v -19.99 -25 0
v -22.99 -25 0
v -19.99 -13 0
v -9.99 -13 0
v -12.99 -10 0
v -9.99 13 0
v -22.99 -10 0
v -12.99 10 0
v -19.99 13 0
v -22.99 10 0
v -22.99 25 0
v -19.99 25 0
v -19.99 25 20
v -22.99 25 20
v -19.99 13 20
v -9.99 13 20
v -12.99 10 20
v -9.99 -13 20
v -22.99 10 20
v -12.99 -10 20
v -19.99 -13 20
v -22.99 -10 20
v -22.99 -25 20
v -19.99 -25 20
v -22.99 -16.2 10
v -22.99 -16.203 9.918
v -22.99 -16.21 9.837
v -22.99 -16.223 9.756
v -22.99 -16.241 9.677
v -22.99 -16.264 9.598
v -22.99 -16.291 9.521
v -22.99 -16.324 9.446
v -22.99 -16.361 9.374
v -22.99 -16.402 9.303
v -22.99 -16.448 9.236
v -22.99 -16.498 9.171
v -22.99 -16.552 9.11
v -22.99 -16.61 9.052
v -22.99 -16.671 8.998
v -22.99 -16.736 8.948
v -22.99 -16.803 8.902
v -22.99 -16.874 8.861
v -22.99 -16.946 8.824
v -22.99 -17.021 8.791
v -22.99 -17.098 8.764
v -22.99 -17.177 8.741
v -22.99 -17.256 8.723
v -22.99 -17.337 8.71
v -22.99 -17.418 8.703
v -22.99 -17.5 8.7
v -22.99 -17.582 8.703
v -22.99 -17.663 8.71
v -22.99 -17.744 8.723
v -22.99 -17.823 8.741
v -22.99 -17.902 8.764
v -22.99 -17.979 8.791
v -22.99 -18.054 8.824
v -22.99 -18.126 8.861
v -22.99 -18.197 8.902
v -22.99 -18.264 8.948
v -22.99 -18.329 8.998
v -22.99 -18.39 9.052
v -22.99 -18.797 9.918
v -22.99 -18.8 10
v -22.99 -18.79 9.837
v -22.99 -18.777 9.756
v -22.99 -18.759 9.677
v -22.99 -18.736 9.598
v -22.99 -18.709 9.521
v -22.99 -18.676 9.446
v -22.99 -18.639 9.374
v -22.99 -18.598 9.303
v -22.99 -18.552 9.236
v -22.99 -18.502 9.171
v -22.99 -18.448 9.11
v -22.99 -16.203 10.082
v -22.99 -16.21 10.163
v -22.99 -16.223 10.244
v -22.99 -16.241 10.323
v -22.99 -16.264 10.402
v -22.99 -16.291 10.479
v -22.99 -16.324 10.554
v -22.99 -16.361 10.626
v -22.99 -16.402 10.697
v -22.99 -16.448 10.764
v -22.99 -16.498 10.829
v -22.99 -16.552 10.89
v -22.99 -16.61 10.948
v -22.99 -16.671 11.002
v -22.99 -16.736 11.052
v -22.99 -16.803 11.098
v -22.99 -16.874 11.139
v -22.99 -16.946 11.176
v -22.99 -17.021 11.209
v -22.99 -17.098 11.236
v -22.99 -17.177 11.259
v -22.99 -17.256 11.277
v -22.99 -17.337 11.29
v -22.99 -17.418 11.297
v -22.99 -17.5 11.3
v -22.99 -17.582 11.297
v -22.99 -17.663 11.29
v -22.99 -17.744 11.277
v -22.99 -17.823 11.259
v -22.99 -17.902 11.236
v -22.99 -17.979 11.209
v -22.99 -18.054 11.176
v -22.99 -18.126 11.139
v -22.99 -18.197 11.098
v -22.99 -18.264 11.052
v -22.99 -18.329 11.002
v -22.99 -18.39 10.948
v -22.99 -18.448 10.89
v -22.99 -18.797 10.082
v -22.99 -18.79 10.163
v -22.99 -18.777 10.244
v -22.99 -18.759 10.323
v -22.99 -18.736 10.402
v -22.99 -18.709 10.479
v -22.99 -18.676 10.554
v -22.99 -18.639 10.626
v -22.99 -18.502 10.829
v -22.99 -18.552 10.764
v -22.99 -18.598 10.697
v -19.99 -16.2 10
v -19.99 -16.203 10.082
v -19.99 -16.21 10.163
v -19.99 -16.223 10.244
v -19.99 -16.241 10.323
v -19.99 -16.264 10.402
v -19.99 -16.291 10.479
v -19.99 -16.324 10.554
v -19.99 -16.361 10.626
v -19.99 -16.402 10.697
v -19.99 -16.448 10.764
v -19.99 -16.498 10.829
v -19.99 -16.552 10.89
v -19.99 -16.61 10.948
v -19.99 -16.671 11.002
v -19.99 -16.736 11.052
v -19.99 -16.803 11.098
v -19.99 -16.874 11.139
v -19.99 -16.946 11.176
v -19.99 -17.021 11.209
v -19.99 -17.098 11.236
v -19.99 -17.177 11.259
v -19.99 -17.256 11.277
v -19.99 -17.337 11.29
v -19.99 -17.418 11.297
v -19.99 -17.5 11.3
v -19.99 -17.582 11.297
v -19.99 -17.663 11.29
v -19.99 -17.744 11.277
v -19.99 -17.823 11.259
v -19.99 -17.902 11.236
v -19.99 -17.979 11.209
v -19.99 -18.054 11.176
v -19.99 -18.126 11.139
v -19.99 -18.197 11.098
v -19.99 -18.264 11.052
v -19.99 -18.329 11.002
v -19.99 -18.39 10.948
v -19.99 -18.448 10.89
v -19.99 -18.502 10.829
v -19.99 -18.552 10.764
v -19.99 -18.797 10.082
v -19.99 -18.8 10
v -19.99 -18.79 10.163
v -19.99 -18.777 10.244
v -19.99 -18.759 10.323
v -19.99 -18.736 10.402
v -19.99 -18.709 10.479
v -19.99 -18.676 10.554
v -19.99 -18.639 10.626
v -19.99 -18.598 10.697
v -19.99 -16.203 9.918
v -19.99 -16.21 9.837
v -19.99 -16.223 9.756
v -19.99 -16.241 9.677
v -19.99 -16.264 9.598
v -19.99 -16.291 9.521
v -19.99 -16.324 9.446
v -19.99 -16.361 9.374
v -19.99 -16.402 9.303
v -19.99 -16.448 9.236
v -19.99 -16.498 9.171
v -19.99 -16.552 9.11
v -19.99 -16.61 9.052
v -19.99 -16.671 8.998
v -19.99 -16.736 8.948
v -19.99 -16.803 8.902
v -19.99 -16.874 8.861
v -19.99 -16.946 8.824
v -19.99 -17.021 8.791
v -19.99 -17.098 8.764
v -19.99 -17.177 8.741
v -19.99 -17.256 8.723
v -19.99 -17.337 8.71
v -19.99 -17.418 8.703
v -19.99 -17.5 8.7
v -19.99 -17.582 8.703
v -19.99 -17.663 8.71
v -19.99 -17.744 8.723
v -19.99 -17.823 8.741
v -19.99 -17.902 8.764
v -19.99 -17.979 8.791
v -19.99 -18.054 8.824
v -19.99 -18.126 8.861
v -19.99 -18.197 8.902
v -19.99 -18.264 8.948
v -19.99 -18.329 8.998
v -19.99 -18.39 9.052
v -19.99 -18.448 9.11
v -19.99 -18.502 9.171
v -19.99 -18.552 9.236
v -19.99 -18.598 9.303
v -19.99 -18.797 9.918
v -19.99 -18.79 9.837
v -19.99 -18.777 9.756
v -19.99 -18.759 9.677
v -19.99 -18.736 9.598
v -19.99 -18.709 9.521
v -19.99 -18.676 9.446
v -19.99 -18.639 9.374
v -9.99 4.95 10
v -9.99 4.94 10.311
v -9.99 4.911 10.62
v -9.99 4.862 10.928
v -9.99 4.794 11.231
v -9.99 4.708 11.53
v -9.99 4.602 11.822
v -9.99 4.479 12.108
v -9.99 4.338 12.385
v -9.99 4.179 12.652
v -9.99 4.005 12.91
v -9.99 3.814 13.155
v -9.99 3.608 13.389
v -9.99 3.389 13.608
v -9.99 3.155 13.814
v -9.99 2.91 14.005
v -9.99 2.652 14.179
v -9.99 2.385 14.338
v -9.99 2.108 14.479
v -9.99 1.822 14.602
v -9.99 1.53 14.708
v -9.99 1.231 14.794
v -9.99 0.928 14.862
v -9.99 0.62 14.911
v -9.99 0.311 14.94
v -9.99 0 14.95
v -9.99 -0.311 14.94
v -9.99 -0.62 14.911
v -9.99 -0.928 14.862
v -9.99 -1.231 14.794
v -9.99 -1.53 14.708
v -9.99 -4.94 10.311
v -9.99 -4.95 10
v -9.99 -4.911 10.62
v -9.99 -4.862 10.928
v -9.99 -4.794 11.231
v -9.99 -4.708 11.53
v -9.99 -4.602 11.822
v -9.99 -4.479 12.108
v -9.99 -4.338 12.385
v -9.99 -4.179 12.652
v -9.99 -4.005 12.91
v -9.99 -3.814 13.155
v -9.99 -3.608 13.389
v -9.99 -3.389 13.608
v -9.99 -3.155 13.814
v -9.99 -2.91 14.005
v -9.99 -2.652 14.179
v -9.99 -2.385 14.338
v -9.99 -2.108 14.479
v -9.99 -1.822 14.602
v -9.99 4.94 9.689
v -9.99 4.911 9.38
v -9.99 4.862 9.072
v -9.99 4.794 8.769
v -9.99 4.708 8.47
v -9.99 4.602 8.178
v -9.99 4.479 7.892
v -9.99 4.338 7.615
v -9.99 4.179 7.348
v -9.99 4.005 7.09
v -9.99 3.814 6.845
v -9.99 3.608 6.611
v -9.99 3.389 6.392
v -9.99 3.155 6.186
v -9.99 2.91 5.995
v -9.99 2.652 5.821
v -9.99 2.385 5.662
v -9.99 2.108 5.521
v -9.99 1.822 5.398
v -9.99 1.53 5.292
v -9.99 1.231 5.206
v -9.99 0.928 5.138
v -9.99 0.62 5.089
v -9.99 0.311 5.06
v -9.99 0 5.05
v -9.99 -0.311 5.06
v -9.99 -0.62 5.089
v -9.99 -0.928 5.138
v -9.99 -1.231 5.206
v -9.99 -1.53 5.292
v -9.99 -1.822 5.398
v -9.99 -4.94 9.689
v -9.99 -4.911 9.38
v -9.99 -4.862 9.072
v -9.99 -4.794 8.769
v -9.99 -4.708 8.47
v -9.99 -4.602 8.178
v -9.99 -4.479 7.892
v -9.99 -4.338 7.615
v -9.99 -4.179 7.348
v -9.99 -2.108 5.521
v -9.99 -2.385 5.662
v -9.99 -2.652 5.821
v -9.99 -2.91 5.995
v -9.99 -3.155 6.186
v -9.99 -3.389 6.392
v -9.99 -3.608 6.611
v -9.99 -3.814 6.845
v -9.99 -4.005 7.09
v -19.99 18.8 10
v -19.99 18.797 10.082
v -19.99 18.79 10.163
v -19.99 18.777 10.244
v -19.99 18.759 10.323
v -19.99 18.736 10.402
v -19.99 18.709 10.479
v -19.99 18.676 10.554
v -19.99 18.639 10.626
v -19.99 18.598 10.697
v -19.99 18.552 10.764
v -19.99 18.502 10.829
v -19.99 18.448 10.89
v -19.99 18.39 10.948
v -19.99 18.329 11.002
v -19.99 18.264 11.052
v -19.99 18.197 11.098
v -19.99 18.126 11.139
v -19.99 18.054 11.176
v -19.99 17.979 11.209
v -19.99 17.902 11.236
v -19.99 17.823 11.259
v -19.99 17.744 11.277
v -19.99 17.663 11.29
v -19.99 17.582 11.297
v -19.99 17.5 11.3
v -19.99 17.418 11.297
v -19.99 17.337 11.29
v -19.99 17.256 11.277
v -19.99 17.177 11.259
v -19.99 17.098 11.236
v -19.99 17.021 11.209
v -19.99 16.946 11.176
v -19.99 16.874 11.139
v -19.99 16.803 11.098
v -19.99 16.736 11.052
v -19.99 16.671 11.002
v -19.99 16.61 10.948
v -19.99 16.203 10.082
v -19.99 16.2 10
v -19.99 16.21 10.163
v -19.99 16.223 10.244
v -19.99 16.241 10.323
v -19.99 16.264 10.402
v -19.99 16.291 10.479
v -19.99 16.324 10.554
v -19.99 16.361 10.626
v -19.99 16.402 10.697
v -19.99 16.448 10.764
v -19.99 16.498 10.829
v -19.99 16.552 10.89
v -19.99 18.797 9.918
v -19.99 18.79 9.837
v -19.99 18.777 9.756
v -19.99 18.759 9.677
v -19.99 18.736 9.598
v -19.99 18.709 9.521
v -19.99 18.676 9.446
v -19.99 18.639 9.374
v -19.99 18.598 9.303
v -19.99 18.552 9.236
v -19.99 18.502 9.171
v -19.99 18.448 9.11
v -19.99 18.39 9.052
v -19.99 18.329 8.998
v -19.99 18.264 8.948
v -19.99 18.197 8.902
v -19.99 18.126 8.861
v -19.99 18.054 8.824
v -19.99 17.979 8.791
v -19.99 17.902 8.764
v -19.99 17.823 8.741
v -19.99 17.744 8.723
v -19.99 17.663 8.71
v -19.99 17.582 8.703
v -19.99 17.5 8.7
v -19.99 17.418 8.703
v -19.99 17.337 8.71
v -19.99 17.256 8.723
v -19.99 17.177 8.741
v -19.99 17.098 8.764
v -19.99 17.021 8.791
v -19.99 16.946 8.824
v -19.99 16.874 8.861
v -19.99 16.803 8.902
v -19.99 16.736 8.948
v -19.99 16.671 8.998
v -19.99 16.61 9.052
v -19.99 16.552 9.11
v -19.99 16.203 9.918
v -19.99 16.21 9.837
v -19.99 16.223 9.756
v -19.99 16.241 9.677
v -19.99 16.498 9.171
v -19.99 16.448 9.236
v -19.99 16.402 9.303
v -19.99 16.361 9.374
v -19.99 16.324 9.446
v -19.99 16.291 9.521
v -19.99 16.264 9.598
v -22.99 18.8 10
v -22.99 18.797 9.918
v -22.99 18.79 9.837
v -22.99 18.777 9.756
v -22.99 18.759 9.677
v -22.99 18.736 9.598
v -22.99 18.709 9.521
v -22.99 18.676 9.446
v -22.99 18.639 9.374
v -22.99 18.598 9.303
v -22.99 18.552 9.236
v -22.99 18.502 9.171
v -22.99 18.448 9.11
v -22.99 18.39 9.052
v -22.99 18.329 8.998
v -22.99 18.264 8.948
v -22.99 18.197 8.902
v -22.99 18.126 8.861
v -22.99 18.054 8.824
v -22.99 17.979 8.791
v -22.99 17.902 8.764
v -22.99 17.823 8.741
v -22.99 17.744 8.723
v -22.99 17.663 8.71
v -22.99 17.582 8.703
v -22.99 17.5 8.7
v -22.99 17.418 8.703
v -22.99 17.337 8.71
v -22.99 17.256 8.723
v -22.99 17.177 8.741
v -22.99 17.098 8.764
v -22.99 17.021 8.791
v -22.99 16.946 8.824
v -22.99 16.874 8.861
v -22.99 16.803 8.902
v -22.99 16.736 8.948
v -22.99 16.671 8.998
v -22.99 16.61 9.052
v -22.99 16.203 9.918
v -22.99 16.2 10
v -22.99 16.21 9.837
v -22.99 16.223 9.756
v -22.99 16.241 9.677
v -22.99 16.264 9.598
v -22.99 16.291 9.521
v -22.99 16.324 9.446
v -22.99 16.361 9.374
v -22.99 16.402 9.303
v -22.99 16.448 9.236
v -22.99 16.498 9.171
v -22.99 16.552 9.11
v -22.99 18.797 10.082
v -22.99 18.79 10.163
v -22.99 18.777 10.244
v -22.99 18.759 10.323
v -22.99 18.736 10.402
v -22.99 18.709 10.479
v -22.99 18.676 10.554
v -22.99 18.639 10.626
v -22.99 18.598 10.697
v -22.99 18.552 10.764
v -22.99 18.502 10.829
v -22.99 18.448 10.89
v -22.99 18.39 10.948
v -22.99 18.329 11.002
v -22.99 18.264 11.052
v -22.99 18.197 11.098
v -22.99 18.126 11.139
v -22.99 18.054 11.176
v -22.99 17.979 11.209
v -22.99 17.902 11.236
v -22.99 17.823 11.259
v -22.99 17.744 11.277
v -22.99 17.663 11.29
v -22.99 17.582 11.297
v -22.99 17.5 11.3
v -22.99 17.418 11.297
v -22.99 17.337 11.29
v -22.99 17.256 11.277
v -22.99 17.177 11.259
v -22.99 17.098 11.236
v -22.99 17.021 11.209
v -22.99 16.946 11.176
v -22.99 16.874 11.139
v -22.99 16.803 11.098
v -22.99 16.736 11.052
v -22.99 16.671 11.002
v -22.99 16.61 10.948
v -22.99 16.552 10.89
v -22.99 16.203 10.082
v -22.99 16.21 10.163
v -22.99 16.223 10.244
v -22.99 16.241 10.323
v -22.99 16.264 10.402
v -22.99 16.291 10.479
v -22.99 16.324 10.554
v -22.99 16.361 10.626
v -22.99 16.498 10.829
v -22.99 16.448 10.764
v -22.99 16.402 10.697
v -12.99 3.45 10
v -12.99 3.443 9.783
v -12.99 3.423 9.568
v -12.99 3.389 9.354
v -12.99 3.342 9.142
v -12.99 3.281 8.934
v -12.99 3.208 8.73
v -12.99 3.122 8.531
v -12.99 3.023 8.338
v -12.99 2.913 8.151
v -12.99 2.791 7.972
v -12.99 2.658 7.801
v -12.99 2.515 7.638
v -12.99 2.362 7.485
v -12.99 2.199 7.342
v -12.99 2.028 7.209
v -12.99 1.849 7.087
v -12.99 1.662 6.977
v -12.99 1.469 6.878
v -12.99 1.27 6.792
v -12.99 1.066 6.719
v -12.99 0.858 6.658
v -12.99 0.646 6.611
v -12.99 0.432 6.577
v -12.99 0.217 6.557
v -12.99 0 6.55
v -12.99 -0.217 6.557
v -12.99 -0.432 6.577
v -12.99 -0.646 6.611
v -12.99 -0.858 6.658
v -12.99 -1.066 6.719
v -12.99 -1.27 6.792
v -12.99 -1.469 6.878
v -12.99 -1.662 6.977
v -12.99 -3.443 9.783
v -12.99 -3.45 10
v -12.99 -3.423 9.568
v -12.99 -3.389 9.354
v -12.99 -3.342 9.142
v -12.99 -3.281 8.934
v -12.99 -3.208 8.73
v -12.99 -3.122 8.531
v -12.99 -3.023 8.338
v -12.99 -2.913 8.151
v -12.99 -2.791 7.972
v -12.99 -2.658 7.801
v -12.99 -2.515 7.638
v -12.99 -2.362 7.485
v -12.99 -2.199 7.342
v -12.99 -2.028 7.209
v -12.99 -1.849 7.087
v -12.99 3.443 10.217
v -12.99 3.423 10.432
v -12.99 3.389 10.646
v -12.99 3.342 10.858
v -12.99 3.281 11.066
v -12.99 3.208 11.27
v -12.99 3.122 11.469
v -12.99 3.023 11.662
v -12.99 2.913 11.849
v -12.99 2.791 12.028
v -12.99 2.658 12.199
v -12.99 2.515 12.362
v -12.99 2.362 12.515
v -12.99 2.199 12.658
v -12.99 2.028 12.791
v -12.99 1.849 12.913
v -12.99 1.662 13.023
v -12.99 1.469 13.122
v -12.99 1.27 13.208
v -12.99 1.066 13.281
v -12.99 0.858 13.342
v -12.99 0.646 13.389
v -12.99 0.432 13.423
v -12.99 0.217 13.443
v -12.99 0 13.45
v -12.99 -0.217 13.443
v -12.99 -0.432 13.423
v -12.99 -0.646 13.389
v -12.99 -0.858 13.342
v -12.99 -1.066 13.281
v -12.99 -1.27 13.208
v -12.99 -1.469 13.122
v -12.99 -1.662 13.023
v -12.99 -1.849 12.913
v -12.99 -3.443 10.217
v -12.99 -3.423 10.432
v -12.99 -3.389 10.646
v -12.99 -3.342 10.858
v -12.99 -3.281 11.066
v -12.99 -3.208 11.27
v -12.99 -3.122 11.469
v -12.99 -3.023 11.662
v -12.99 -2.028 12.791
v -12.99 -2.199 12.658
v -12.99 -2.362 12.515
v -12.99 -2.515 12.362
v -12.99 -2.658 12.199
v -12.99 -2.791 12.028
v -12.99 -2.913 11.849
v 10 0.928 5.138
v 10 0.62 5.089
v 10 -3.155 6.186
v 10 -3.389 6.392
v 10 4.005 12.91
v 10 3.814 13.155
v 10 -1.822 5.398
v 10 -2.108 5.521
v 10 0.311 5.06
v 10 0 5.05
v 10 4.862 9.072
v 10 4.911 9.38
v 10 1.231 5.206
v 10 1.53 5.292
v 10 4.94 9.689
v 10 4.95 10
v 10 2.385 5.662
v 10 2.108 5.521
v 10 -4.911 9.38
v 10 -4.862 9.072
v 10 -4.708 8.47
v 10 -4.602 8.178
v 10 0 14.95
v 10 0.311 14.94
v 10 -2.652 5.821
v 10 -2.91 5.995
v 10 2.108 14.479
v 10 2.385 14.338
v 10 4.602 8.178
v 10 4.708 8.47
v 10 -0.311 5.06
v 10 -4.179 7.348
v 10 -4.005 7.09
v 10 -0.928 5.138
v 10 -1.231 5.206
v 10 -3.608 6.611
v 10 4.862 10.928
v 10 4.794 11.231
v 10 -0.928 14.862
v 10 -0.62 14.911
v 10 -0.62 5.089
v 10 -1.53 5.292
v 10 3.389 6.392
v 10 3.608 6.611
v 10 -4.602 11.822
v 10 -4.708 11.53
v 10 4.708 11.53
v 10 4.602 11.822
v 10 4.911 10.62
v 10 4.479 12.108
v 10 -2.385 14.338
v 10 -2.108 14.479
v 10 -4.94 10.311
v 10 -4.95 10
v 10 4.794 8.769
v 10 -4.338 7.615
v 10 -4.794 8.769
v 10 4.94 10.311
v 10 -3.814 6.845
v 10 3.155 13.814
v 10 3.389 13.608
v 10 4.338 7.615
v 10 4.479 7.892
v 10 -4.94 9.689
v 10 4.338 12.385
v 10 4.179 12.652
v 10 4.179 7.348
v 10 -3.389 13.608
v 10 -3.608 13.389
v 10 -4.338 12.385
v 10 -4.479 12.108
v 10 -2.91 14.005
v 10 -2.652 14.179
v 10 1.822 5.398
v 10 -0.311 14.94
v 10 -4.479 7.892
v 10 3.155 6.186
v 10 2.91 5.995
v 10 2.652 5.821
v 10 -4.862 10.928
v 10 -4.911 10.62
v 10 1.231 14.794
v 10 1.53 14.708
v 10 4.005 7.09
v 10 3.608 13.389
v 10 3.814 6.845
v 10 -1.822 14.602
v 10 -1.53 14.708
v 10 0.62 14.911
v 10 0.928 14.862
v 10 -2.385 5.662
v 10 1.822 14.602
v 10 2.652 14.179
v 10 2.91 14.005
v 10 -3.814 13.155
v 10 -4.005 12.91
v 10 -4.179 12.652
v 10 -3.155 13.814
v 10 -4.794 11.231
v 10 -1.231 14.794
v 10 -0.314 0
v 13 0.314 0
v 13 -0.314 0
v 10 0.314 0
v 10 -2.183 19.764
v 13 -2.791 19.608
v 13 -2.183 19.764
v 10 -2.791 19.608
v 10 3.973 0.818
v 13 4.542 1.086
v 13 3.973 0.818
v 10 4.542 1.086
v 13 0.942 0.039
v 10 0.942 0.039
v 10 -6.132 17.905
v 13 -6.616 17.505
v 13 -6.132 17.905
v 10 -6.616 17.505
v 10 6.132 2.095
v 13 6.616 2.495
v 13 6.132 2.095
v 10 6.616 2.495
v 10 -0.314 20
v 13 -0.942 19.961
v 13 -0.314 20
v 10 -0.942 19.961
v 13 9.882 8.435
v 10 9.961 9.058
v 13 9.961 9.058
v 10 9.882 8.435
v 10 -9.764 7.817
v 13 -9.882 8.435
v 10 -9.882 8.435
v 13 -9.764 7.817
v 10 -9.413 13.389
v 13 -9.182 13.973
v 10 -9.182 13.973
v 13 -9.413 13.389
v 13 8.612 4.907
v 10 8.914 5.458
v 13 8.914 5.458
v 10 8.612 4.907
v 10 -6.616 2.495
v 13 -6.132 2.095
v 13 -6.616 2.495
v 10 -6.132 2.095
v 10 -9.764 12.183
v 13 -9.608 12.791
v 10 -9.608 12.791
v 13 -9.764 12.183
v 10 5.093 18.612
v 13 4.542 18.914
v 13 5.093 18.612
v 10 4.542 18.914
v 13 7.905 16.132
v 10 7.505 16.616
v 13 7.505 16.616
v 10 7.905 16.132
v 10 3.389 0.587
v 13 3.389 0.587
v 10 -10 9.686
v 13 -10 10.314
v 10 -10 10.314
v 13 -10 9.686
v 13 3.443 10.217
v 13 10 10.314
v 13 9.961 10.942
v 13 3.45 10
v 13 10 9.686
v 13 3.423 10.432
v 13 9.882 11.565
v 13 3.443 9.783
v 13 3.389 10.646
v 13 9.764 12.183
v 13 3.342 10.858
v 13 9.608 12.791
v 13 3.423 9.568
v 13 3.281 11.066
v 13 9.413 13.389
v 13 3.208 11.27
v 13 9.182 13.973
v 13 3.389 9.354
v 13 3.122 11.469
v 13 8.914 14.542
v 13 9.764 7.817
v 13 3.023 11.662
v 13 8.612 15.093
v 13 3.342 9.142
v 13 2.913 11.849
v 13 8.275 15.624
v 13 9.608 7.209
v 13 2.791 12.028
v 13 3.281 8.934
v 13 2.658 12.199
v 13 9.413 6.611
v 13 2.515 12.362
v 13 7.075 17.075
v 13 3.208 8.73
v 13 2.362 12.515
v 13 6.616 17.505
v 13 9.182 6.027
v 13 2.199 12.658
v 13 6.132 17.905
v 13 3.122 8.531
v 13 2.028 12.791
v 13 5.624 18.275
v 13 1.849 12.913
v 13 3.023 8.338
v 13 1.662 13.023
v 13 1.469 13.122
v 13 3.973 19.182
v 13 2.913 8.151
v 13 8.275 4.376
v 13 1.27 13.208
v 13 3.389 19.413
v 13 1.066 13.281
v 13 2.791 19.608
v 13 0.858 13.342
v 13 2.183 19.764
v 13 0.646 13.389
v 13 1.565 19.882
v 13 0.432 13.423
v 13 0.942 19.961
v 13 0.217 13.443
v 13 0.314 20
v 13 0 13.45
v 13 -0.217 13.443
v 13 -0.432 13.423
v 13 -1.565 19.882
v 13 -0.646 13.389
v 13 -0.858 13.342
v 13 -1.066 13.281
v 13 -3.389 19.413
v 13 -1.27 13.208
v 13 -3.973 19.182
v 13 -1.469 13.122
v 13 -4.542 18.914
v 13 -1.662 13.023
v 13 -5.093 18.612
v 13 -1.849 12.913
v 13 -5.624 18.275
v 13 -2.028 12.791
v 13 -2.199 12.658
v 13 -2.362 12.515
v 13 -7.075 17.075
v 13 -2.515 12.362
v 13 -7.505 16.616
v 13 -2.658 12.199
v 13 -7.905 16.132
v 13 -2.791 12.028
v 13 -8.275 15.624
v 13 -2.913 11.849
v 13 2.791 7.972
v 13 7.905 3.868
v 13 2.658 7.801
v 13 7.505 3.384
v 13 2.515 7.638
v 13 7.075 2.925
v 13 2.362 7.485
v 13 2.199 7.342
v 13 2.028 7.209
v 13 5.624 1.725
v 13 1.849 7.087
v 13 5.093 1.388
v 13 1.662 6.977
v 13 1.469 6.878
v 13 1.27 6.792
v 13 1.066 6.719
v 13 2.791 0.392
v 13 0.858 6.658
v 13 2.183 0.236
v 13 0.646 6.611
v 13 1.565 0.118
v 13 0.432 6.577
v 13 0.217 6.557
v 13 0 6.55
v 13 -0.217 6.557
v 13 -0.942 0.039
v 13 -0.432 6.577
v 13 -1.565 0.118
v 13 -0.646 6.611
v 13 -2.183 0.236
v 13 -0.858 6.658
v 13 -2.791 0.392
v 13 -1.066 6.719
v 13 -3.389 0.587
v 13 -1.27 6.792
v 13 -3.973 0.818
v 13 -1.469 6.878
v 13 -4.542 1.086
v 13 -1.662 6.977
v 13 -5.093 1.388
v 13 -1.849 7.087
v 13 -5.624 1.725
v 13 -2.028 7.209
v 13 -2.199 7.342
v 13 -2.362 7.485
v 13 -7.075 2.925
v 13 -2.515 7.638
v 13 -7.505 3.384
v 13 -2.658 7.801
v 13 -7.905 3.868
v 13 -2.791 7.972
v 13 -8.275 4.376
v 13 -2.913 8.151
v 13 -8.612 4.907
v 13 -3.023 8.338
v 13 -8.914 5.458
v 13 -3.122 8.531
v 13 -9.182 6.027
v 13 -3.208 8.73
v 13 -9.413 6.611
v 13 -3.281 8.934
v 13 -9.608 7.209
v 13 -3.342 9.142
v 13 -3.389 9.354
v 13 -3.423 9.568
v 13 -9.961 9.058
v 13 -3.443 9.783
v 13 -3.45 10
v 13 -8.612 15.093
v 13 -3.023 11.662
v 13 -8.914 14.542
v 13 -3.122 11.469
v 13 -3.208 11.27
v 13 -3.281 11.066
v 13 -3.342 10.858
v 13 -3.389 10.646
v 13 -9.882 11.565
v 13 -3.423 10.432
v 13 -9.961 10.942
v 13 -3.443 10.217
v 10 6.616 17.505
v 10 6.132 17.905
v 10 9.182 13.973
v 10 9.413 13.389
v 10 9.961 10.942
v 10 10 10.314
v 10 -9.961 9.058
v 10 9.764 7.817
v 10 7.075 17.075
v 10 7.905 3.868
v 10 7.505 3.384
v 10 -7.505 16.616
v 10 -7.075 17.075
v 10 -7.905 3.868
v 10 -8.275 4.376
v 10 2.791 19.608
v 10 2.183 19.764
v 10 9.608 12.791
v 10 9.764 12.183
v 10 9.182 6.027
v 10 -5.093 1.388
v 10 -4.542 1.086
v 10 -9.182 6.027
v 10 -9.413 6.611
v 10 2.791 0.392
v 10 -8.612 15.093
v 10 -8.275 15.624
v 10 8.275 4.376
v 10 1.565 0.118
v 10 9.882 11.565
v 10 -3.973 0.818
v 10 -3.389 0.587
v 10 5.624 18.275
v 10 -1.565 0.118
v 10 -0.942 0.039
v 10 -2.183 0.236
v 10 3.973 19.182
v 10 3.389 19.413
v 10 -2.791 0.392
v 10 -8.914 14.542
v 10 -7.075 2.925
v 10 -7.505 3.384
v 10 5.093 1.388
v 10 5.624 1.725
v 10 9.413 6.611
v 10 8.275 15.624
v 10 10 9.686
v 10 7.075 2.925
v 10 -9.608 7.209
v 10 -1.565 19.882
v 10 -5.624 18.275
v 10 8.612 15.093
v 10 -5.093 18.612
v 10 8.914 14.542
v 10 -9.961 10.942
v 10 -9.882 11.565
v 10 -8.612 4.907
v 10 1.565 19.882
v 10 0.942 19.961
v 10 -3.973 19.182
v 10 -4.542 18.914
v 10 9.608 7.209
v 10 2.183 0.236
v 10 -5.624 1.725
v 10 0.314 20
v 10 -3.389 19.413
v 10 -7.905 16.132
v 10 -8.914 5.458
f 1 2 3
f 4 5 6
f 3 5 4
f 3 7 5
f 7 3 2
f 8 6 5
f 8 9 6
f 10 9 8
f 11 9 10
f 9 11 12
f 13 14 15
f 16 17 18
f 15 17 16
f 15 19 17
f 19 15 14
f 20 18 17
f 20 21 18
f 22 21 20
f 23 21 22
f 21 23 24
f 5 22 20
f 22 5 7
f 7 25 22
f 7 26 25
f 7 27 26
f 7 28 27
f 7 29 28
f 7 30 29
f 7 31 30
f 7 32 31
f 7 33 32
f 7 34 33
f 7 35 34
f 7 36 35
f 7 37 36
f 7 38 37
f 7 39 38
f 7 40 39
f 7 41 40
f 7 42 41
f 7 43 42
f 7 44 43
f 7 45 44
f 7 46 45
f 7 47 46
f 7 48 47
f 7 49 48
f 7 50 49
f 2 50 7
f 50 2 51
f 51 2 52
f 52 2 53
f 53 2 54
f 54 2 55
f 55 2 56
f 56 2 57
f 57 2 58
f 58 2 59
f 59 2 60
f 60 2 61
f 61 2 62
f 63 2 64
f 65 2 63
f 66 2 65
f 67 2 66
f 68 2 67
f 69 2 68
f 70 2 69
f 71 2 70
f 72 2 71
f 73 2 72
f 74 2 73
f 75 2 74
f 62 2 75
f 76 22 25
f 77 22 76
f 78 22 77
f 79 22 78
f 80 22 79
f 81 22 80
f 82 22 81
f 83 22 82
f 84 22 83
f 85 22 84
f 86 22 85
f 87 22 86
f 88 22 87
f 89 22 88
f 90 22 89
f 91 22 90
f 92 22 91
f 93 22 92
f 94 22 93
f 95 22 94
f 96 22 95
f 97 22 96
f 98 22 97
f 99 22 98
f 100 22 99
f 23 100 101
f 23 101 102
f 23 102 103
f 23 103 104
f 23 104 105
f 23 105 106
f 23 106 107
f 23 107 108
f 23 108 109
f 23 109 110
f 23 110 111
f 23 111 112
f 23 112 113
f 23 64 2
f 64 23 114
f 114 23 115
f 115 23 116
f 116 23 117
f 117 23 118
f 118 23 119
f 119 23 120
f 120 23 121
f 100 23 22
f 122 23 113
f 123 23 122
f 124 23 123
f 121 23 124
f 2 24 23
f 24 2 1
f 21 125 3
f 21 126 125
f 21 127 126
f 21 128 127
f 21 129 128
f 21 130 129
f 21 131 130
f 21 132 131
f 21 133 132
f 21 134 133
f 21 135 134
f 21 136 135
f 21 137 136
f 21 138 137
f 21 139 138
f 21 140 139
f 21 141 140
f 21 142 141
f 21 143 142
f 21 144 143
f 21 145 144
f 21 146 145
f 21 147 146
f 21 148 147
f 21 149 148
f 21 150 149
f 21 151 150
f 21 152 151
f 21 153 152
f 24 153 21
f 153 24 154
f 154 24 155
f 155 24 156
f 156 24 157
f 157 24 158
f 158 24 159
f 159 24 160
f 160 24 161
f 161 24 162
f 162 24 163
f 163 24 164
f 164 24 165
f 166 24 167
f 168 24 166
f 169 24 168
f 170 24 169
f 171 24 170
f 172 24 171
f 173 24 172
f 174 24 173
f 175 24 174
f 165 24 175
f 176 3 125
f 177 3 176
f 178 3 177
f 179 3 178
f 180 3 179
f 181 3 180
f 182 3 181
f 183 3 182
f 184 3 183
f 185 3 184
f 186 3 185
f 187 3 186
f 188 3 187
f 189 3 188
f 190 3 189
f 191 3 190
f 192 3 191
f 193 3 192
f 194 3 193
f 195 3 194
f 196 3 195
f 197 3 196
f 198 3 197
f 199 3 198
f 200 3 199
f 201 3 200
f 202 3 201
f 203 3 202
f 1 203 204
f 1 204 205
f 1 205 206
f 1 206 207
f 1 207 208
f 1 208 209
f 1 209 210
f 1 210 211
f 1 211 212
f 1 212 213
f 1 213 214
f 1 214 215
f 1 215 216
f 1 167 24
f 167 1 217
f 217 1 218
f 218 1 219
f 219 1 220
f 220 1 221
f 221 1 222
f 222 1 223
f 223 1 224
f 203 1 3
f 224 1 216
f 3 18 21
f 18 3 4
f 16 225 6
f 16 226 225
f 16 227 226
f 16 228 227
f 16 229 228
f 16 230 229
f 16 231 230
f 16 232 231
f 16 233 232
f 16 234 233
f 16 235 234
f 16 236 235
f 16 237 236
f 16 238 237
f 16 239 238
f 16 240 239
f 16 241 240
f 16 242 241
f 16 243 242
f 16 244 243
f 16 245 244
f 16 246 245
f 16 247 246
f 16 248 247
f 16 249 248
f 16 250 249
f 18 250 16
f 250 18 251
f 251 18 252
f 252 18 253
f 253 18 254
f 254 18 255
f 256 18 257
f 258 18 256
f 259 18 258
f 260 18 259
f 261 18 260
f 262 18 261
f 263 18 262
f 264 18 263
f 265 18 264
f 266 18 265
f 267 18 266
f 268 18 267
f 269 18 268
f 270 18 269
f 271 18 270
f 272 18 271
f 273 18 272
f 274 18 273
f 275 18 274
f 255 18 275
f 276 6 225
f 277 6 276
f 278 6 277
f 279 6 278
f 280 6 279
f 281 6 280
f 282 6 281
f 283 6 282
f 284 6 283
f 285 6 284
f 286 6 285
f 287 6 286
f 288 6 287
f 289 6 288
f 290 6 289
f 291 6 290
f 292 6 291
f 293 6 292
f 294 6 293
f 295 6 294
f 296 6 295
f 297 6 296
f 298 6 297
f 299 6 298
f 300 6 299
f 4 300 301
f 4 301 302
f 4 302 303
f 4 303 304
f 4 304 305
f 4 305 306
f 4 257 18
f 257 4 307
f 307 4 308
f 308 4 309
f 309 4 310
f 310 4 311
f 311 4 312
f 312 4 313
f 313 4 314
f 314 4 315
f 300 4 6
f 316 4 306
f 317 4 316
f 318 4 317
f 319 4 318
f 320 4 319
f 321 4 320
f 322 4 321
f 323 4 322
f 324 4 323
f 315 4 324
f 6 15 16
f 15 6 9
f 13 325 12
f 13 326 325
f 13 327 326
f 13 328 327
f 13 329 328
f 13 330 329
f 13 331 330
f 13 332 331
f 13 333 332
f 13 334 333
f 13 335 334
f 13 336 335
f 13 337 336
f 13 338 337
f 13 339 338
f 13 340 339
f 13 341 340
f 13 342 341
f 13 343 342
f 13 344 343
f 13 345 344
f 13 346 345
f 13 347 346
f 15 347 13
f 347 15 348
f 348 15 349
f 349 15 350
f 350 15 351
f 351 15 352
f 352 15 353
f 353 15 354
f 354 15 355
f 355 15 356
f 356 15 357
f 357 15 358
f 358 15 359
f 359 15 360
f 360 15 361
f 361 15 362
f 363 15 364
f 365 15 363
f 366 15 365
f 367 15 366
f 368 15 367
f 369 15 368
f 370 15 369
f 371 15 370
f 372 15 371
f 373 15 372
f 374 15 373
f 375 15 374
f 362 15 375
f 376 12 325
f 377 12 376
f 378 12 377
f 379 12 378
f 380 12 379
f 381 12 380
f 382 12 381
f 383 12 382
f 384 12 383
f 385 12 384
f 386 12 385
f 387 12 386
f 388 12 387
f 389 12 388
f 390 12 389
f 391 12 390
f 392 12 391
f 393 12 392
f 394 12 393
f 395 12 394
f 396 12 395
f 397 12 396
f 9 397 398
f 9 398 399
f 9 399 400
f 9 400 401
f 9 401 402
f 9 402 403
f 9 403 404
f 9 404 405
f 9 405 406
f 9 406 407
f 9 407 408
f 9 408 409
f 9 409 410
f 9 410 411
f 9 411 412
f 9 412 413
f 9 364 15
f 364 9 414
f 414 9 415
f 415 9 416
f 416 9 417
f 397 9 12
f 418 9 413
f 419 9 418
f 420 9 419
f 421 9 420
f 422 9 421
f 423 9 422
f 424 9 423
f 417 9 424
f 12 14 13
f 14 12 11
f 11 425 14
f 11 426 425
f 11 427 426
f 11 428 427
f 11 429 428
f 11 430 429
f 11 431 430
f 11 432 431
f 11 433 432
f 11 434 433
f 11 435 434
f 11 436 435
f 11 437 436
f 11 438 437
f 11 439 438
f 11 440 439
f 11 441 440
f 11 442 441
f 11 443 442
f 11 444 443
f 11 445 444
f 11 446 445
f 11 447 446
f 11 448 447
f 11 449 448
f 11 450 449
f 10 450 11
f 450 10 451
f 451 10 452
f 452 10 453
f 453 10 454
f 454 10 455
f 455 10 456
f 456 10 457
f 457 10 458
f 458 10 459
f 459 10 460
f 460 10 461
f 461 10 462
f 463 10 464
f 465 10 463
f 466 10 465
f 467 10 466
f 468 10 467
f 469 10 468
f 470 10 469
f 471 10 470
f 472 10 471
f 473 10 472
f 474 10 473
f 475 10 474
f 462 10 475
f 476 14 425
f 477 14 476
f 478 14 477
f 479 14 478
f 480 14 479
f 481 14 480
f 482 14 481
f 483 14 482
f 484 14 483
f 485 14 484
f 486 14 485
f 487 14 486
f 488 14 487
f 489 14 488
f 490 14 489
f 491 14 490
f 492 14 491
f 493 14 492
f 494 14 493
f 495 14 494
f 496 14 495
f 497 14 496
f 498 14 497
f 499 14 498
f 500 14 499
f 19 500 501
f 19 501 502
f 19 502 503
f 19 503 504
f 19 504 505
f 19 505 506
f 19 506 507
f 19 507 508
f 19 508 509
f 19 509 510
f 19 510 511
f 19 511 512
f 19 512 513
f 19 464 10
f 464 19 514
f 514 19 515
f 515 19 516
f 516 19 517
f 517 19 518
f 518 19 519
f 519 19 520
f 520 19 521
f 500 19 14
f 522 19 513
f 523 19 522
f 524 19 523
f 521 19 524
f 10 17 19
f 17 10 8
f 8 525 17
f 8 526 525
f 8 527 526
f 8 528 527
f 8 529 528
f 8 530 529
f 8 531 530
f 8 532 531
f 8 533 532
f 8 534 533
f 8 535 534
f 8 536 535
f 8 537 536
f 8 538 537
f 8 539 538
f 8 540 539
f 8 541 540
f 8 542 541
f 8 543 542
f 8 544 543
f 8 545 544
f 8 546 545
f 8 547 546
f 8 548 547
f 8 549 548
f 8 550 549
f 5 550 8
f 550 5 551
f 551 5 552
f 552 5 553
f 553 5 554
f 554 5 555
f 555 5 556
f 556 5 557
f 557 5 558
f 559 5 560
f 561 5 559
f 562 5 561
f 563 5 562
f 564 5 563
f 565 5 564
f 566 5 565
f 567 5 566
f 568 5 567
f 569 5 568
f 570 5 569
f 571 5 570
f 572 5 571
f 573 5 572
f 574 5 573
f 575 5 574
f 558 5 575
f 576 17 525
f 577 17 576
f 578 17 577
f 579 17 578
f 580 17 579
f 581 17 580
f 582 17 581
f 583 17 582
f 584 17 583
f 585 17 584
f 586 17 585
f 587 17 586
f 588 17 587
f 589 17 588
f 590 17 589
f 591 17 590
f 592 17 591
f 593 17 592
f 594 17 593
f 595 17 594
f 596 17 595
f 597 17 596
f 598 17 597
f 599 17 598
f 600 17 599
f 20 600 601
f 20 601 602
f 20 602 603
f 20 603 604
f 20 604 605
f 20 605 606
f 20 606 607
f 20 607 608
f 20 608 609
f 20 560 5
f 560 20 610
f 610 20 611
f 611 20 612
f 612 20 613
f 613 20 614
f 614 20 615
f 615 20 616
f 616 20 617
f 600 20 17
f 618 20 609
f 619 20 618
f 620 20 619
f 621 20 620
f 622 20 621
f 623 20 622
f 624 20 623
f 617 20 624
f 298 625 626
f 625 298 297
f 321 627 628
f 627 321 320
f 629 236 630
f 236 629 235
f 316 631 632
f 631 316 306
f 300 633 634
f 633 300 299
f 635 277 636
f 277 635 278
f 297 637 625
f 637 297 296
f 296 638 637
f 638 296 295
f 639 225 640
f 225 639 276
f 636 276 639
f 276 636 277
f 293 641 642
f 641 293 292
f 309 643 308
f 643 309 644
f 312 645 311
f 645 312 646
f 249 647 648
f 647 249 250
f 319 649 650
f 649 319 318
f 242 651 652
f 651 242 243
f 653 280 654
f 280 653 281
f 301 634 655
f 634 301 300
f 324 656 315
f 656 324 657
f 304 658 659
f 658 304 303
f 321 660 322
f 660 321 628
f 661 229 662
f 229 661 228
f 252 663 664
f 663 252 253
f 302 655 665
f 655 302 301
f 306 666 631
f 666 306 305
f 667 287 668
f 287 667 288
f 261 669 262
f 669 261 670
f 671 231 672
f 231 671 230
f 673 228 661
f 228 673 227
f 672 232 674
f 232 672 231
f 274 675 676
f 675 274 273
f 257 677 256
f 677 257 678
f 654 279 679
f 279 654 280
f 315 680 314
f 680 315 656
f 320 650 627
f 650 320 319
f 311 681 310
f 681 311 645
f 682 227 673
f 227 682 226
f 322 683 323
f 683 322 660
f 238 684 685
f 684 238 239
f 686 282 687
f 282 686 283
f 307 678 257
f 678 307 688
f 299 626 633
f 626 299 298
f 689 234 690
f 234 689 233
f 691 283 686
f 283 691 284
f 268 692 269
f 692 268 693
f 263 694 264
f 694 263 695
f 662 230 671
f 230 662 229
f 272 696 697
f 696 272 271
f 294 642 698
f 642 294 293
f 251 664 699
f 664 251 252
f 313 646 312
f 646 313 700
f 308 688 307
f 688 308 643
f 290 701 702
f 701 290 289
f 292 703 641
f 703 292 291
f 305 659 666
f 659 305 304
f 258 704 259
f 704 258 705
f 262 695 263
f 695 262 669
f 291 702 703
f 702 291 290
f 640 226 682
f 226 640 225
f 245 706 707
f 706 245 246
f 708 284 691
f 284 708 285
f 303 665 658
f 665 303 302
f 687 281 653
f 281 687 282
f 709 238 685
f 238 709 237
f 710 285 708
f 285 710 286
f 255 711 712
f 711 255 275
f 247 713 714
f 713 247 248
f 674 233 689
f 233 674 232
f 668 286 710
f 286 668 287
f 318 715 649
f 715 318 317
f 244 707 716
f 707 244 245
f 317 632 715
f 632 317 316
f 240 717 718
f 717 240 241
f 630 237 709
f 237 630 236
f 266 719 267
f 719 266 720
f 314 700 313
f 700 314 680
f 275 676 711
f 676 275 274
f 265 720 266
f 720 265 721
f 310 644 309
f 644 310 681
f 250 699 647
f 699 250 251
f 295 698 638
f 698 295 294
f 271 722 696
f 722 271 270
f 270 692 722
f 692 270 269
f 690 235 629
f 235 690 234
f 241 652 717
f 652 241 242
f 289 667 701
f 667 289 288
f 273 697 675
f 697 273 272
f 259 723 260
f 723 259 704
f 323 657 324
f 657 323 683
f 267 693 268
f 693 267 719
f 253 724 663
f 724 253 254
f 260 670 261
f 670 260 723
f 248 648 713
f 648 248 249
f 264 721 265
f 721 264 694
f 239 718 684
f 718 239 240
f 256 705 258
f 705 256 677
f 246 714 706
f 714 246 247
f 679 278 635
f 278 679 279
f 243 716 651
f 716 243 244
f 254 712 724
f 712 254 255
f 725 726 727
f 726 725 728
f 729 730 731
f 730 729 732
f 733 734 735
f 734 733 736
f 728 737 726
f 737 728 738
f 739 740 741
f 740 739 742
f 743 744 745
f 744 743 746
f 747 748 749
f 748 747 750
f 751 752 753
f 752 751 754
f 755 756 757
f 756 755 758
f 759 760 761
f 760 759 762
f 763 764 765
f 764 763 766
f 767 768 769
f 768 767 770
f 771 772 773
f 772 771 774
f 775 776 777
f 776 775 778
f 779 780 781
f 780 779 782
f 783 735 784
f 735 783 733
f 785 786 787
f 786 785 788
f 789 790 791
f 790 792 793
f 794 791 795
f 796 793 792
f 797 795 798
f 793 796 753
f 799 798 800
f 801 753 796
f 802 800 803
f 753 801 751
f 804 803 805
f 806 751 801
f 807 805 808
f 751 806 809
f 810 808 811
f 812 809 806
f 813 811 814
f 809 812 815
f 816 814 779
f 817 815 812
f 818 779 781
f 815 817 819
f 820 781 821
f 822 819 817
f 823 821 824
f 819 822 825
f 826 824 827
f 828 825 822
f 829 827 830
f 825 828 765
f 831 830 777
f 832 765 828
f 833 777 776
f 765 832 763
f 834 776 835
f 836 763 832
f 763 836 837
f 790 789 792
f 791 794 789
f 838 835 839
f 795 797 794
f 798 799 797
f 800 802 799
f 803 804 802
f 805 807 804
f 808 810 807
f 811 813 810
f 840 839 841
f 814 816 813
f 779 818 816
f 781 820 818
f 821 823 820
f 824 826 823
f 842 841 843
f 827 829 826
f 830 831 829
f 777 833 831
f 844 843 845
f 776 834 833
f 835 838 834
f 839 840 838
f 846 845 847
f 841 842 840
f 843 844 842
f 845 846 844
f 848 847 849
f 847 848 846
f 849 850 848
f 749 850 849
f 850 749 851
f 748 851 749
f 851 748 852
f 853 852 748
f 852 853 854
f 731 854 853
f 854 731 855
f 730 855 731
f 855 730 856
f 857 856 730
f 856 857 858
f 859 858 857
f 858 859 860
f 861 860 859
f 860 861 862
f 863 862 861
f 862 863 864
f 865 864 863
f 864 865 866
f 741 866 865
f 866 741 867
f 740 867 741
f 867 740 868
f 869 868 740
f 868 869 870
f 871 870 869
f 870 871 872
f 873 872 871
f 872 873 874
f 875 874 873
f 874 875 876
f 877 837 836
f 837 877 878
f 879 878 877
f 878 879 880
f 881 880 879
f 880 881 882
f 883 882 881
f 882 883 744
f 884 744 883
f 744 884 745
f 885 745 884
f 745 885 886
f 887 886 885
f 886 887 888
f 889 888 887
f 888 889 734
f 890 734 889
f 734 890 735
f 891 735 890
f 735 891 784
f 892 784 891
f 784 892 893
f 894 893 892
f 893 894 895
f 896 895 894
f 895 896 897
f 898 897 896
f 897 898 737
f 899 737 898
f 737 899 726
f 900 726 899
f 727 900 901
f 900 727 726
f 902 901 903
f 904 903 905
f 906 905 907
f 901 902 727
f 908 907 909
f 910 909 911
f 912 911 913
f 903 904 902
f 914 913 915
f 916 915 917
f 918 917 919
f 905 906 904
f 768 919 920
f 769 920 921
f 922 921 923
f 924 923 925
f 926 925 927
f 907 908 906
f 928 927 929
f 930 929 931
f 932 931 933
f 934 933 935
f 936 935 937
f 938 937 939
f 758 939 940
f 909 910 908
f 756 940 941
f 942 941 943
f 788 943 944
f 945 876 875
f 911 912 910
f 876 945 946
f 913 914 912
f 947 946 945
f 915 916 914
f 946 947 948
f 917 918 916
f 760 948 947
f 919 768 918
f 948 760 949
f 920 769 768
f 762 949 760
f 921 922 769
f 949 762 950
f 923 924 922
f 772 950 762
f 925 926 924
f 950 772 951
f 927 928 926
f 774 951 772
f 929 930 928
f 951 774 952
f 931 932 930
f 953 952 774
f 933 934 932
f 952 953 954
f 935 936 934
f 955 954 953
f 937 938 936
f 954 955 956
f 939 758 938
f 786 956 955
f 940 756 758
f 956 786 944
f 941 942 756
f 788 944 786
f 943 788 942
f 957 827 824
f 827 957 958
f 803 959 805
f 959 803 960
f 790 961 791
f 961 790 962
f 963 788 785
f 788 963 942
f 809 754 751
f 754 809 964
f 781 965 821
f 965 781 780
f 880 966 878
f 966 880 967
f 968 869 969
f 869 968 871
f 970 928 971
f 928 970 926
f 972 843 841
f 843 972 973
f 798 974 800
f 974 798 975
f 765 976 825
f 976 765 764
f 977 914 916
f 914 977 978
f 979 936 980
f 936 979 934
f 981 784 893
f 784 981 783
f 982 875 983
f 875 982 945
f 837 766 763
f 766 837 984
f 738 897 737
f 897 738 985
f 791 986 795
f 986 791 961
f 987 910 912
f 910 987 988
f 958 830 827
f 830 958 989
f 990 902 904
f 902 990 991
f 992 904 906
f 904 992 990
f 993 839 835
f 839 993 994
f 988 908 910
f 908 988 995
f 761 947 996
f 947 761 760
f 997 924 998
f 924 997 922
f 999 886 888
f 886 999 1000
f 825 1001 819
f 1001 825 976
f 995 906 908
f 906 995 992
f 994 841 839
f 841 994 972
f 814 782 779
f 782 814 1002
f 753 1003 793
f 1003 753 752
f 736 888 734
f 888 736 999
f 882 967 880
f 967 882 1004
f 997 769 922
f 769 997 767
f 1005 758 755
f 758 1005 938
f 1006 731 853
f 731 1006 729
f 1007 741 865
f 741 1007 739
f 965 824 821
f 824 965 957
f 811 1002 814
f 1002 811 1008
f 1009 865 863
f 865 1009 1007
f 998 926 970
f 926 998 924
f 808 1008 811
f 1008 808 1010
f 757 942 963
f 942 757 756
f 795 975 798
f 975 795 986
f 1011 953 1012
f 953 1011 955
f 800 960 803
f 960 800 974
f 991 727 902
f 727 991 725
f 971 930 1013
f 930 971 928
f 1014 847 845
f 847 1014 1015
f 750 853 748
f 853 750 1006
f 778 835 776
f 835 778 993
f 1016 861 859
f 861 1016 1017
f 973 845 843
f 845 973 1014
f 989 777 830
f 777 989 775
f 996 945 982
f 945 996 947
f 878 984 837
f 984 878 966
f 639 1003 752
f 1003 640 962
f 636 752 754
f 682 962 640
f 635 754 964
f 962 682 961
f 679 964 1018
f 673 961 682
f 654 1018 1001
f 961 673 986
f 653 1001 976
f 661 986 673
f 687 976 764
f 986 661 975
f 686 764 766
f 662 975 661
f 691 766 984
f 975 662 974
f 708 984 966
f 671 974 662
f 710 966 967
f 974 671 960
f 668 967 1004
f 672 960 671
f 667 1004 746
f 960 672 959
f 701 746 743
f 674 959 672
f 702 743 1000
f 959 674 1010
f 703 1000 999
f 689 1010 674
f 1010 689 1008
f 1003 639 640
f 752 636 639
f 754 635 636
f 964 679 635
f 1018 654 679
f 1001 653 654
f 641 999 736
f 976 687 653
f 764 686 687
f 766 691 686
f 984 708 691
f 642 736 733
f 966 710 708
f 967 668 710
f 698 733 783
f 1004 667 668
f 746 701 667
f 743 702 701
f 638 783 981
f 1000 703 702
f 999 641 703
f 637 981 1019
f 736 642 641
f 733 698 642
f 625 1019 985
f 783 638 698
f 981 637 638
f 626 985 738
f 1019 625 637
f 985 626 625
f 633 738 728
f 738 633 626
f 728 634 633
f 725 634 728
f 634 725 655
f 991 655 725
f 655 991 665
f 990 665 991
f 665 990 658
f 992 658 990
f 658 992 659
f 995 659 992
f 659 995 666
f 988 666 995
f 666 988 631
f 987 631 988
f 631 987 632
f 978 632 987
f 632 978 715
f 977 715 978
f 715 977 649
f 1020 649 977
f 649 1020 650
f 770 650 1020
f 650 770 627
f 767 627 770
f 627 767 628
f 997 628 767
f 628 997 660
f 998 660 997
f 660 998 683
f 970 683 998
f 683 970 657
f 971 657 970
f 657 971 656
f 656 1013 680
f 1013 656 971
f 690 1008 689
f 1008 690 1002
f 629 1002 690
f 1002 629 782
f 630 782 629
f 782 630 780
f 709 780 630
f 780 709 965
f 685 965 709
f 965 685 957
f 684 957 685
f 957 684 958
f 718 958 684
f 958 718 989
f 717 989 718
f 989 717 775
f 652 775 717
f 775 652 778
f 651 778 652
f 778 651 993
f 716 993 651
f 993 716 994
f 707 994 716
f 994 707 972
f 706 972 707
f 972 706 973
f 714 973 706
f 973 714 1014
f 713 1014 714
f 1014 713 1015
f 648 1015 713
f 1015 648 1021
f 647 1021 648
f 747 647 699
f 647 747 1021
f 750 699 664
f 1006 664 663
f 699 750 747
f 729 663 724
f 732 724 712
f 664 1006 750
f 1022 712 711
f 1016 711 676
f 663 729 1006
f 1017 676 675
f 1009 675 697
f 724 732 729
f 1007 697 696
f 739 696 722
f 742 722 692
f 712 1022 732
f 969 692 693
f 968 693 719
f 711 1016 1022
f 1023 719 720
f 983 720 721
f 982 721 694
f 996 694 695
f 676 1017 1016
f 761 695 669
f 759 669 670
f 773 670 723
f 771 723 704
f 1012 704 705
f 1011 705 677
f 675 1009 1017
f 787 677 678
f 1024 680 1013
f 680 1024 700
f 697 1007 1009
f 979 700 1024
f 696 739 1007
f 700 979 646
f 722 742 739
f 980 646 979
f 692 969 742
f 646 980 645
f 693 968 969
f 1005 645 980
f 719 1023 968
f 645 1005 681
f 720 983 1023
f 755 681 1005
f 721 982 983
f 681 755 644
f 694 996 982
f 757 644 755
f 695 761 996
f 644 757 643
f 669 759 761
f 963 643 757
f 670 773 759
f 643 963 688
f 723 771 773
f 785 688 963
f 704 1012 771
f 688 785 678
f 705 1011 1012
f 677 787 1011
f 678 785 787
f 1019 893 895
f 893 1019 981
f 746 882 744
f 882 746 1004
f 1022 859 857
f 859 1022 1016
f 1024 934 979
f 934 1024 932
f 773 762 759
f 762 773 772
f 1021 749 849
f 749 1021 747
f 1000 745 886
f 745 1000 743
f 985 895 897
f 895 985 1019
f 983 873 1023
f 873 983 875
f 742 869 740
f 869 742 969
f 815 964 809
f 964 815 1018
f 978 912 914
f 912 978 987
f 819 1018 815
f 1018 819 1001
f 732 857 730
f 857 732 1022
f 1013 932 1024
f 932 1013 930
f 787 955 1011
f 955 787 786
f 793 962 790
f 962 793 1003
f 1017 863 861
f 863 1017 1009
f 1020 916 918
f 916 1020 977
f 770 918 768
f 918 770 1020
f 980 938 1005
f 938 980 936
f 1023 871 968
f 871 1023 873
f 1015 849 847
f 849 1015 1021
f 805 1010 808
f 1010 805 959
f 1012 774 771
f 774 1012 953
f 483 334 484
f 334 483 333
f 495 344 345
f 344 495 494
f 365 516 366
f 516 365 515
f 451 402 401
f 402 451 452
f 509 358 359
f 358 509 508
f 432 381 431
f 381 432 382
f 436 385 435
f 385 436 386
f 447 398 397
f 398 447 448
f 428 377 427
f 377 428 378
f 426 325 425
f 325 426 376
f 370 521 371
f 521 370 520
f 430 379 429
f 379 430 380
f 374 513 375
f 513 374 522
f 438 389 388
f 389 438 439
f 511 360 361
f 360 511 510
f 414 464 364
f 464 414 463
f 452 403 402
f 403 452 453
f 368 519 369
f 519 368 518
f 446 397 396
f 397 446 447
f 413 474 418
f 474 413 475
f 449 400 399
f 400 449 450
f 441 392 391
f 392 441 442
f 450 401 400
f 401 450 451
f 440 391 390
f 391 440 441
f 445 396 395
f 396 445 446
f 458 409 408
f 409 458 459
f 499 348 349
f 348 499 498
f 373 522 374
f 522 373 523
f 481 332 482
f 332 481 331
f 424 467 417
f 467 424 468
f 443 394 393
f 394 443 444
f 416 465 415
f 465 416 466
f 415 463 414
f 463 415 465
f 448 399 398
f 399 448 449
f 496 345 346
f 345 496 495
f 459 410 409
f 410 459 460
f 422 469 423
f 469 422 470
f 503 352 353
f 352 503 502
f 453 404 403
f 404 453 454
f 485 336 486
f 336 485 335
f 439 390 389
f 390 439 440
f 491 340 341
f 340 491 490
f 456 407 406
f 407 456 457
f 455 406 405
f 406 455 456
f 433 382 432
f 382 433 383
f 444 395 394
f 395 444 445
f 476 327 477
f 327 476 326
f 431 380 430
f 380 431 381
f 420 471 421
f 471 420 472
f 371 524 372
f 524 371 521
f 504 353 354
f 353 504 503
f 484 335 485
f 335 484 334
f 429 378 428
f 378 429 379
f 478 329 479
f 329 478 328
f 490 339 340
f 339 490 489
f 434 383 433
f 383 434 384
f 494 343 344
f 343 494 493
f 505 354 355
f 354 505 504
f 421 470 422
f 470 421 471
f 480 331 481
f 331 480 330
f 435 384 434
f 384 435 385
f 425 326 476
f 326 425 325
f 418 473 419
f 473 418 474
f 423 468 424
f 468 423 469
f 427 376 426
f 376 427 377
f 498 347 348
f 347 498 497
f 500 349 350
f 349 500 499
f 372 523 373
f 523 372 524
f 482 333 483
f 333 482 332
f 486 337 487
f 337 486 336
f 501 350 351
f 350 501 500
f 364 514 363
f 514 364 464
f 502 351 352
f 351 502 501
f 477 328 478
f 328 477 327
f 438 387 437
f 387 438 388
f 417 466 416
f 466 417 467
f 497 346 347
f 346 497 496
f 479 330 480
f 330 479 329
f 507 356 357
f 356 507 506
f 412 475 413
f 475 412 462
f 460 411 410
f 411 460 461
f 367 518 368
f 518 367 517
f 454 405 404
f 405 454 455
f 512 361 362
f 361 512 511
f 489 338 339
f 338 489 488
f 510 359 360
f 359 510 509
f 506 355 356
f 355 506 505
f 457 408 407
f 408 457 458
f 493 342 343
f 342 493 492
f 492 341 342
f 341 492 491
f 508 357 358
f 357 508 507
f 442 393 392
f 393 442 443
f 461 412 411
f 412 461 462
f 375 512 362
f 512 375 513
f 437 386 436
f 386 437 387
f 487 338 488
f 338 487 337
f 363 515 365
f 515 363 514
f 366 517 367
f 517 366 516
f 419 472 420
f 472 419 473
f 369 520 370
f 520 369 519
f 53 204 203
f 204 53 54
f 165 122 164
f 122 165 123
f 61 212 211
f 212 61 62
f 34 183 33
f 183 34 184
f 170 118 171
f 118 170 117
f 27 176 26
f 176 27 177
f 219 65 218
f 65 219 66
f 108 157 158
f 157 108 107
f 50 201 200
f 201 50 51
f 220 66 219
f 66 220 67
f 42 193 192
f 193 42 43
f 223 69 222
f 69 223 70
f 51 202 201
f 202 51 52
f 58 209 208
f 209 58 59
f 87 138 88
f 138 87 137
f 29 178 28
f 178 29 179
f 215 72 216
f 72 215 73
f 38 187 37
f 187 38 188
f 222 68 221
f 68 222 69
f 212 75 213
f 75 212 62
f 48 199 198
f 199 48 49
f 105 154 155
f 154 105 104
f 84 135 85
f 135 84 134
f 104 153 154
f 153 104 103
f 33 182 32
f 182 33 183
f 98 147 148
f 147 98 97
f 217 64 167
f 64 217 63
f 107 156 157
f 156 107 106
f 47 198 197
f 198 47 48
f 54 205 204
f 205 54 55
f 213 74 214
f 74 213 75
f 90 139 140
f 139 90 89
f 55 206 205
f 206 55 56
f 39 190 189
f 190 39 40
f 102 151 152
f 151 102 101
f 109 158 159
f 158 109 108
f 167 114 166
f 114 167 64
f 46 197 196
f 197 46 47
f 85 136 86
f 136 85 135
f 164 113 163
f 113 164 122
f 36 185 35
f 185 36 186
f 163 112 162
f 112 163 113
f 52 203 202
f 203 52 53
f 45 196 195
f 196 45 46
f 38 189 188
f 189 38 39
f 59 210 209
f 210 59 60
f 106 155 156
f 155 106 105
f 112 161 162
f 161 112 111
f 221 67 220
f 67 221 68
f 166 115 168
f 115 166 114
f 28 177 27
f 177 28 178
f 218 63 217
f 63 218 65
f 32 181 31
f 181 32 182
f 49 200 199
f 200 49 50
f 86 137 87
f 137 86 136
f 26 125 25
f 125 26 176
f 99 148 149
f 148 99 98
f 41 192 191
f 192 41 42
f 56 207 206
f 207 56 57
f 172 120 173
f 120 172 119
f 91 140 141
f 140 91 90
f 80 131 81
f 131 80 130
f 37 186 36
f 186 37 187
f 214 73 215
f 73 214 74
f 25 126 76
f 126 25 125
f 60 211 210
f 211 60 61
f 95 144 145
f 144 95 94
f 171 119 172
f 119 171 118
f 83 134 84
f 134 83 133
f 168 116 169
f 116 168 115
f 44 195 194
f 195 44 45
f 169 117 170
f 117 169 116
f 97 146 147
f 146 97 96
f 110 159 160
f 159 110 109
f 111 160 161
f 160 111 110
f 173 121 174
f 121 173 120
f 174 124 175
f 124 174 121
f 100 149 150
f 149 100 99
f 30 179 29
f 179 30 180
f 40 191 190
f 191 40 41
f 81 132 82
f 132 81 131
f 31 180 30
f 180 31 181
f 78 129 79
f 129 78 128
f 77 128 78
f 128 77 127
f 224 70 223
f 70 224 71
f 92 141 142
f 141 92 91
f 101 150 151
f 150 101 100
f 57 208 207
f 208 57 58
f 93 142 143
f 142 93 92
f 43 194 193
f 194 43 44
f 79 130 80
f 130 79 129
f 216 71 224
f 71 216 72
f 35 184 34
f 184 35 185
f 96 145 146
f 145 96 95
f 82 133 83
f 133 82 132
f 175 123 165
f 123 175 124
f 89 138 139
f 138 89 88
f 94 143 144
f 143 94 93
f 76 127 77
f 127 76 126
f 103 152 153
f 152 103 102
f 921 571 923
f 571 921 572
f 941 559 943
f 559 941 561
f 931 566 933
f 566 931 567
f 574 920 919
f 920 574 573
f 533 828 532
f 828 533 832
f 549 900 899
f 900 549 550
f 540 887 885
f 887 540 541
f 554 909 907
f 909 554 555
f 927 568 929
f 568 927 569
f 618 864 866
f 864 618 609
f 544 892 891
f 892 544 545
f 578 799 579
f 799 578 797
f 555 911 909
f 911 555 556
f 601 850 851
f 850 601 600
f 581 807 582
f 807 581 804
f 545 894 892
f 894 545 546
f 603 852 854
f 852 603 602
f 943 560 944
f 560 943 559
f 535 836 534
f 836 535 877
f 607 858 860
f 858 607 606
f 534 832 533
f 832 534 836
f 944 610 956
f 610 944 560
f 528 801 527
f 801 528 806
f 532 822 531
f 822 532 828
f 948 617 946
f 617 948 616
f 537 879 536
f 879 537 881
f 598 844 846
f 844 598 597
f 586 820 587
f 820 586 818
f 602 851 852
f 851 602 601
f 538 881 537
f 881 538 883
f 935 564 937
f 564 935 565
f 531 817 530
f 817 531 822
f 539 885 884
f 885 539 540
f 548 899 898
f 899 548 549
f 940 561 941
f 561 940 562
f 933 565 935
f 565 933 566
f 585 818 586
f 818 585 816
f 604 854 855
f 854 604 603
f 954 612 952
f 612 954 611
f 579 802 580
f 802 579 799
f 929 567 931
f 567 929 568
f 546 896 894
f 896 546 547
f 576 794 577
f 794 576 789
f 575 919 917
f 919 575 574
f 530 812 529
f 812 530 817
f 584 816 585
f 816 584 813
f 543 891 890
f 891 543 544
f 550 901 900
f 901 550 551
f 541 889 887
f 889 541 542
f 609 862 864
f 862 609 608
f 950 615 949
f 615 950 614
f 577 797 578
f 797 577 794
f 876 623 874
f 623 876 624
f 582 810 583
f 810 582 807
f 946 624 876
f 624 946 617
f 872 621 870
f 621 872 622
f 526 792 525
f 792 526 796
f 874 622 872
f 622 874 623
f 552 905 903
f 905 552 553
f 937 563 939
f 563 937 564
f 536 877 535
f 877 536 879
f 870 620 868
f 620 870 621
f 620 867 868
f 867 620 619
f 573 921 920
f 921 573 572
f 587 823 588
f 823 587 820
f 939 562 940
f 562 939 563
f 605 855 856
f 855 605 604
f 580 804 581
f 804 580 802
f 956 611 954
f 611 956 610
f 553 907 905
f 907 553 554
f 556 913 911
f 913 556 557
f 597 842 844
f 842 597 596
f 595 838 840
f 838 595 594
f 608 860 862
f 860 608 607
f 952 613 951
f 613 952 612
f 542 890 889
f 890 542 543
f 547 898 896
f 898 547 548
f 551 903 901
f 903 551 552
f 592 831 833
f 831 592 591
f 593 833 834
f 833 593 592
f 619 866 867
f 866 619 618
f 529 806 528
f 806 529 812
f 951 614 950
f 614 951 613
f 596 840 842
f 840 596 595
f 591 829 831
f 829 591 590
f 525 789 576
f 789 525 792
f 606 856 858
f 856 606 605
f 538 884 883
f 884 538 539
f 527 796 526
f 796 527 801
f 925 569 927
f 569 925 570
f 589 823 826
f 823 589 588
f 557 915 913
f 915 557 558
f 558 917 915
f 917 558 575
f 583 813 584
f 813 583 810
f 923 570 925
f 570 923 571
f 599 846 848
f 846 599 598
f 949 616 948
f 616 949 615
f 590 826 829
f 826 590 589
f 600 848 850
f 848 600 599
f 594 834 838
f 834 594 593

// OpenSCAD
M = 1000;
epsilon = 0.01;

tolerance = 0.6;

wall_thickness = 3;

rod_diameter = 6.4+0.5;
spool_diameter = rod_diameter + wall_thickness;
spool_length = 20;

holder_width = 20;
mount_height = 10;
feet_width = 15;
holder_height = 20;
mount_bolt_diameter = 2;

$fn = 100;

module mirror_x(){
    children();
    scale([1,-1]) children();
}

/*
translate([0,0,spool_diameter/2])
rotate([0,90,0])
difference(){
    union() {
        cylinder(d = spool_diameter, h = spool_length, center=true, $fn=$fn);
        
        translate([0,0,-wall_thickness/2-spool_length/2+epsilon])
        cube([spool_diameter, holder_width,wall_thickness],center=true);
        
        translate([0,0,-wall_thickness/2+spool_length/2-epsilon])
        cube([spool_diameter, holder_width,wall_thickness],center=true);
    }
    cylinder(d = rod_diameter, h = M, center=true, $fn=$fn);
}

*/

difference() {
    union() {
        
        linear_extrude(height=holder_height) {
//            translate([spool_length/2-epsilon,-holder_width/2-wall_thickness])
//            square([wall_thickness, holder_width+wall_thickness*2]);
            
            translate([-spool_length/2-wall_thickness+epsilon,-holder_width/2])
            square([wall_thickness, holder_width]);
            
            mirror_x(){
                translate([-spool_length/2-mount_height-wall_thickness+epsilon,holder_width/2])
                square([wall_thickness, feet_width]);

                translate([-spool_length/2-mount_height-wall_thickness+epsilon,holder_width/2])
                square([mount_height+wall_thickness, wall_thickness]);
                
            }
        }
        
        translate([0,0,holder_height/2])
        rotate([0,90,0])
        cylinder(d=spool_diameter, h=spool_length+epsilon, center=true);
        
        N = 100;
        
        translate([spool_length/2,0,holder_height/2])
        rotate([0,90,0])
        rotate([0,0,180/N])
        cylinder(d=holder_width/cos(180/N), h=wall_thickness, $fn=N);
        
    }
    
    translate([0,0,holder_height/2])
    rotate([0,90,0])
    cylinder(d=rod_diameter, h=M, center=true);
    
    mirror_x(){
        
        translate([0,holder_width/2+feet_width/2,holder_height/2])
        rotate([0,90,0])
        cylinder(d=mount_bolt_diameter+tolerance,h=M,center=true);
        
    }
}

/*
spool_mount_bolt_diameter = 4;
spool_mount_countersink_diameter = 7.3;
spool_mount_countersink = 2.5;
spool_mount_bolt_spacing = 21;
spool_mount_thickness = wall_thickness+spool_mount_countersink+wall_thickness;

post_length = wall_thickness*1.5;

module mount_bolt_holes() {
    for(i=[0:3]) {
        rotate([0,0,i*90+45])
        translate([(spool_mount_bolt_spacing-spool_mount_bolt_diameter)/sqrt(2),0,0]) {
            cylinder(d=spool_mount_bolt_diameter+tolerance,h=M,center=true);            
            translate([0,0,spool_mount_thickness-spool_mount_countersink-wall_thickness])
                cylinder(d=spool_mount_countersink_diameter+tolerance,h=M);
        }
    }
}


translate([25,0,0]){
    difference(){
        cylinder(d=holder_width+feet_width*2, h=spool_mount_thickness);
        
        mount_bolt_holes();
        
        translate([0,0,spool_mount_thickness-wall_thickness/2+epsilon])
        cube([holder_height,holder_width+feet_width*2+tolerance*2, wall_thickness],center=true);
        
    }
    
    mirror_x(){
        translate([0,holder_width/2+feet_width/2])
        cylinder(d=mount_bolt_diameter,h=post_length+spool_mount_thickness-wall_thickness);
    }
}

translate([-25,0,0]) {
    
    difference(){
        cylinder(d=max(holder_width+wall_thickness*2,spool_mount_bolt_spacing/cos(45)+wall_thickness*2), h=spool_mount_thickness);
        
        mount_bolt_holes();
        
        translate([0,0,spool_mount_thickness-wall_thickness+epsilon])
        cylinder(d=holder_width+tolerance,h=wall_thickness);
        
    }
    
}



*/
